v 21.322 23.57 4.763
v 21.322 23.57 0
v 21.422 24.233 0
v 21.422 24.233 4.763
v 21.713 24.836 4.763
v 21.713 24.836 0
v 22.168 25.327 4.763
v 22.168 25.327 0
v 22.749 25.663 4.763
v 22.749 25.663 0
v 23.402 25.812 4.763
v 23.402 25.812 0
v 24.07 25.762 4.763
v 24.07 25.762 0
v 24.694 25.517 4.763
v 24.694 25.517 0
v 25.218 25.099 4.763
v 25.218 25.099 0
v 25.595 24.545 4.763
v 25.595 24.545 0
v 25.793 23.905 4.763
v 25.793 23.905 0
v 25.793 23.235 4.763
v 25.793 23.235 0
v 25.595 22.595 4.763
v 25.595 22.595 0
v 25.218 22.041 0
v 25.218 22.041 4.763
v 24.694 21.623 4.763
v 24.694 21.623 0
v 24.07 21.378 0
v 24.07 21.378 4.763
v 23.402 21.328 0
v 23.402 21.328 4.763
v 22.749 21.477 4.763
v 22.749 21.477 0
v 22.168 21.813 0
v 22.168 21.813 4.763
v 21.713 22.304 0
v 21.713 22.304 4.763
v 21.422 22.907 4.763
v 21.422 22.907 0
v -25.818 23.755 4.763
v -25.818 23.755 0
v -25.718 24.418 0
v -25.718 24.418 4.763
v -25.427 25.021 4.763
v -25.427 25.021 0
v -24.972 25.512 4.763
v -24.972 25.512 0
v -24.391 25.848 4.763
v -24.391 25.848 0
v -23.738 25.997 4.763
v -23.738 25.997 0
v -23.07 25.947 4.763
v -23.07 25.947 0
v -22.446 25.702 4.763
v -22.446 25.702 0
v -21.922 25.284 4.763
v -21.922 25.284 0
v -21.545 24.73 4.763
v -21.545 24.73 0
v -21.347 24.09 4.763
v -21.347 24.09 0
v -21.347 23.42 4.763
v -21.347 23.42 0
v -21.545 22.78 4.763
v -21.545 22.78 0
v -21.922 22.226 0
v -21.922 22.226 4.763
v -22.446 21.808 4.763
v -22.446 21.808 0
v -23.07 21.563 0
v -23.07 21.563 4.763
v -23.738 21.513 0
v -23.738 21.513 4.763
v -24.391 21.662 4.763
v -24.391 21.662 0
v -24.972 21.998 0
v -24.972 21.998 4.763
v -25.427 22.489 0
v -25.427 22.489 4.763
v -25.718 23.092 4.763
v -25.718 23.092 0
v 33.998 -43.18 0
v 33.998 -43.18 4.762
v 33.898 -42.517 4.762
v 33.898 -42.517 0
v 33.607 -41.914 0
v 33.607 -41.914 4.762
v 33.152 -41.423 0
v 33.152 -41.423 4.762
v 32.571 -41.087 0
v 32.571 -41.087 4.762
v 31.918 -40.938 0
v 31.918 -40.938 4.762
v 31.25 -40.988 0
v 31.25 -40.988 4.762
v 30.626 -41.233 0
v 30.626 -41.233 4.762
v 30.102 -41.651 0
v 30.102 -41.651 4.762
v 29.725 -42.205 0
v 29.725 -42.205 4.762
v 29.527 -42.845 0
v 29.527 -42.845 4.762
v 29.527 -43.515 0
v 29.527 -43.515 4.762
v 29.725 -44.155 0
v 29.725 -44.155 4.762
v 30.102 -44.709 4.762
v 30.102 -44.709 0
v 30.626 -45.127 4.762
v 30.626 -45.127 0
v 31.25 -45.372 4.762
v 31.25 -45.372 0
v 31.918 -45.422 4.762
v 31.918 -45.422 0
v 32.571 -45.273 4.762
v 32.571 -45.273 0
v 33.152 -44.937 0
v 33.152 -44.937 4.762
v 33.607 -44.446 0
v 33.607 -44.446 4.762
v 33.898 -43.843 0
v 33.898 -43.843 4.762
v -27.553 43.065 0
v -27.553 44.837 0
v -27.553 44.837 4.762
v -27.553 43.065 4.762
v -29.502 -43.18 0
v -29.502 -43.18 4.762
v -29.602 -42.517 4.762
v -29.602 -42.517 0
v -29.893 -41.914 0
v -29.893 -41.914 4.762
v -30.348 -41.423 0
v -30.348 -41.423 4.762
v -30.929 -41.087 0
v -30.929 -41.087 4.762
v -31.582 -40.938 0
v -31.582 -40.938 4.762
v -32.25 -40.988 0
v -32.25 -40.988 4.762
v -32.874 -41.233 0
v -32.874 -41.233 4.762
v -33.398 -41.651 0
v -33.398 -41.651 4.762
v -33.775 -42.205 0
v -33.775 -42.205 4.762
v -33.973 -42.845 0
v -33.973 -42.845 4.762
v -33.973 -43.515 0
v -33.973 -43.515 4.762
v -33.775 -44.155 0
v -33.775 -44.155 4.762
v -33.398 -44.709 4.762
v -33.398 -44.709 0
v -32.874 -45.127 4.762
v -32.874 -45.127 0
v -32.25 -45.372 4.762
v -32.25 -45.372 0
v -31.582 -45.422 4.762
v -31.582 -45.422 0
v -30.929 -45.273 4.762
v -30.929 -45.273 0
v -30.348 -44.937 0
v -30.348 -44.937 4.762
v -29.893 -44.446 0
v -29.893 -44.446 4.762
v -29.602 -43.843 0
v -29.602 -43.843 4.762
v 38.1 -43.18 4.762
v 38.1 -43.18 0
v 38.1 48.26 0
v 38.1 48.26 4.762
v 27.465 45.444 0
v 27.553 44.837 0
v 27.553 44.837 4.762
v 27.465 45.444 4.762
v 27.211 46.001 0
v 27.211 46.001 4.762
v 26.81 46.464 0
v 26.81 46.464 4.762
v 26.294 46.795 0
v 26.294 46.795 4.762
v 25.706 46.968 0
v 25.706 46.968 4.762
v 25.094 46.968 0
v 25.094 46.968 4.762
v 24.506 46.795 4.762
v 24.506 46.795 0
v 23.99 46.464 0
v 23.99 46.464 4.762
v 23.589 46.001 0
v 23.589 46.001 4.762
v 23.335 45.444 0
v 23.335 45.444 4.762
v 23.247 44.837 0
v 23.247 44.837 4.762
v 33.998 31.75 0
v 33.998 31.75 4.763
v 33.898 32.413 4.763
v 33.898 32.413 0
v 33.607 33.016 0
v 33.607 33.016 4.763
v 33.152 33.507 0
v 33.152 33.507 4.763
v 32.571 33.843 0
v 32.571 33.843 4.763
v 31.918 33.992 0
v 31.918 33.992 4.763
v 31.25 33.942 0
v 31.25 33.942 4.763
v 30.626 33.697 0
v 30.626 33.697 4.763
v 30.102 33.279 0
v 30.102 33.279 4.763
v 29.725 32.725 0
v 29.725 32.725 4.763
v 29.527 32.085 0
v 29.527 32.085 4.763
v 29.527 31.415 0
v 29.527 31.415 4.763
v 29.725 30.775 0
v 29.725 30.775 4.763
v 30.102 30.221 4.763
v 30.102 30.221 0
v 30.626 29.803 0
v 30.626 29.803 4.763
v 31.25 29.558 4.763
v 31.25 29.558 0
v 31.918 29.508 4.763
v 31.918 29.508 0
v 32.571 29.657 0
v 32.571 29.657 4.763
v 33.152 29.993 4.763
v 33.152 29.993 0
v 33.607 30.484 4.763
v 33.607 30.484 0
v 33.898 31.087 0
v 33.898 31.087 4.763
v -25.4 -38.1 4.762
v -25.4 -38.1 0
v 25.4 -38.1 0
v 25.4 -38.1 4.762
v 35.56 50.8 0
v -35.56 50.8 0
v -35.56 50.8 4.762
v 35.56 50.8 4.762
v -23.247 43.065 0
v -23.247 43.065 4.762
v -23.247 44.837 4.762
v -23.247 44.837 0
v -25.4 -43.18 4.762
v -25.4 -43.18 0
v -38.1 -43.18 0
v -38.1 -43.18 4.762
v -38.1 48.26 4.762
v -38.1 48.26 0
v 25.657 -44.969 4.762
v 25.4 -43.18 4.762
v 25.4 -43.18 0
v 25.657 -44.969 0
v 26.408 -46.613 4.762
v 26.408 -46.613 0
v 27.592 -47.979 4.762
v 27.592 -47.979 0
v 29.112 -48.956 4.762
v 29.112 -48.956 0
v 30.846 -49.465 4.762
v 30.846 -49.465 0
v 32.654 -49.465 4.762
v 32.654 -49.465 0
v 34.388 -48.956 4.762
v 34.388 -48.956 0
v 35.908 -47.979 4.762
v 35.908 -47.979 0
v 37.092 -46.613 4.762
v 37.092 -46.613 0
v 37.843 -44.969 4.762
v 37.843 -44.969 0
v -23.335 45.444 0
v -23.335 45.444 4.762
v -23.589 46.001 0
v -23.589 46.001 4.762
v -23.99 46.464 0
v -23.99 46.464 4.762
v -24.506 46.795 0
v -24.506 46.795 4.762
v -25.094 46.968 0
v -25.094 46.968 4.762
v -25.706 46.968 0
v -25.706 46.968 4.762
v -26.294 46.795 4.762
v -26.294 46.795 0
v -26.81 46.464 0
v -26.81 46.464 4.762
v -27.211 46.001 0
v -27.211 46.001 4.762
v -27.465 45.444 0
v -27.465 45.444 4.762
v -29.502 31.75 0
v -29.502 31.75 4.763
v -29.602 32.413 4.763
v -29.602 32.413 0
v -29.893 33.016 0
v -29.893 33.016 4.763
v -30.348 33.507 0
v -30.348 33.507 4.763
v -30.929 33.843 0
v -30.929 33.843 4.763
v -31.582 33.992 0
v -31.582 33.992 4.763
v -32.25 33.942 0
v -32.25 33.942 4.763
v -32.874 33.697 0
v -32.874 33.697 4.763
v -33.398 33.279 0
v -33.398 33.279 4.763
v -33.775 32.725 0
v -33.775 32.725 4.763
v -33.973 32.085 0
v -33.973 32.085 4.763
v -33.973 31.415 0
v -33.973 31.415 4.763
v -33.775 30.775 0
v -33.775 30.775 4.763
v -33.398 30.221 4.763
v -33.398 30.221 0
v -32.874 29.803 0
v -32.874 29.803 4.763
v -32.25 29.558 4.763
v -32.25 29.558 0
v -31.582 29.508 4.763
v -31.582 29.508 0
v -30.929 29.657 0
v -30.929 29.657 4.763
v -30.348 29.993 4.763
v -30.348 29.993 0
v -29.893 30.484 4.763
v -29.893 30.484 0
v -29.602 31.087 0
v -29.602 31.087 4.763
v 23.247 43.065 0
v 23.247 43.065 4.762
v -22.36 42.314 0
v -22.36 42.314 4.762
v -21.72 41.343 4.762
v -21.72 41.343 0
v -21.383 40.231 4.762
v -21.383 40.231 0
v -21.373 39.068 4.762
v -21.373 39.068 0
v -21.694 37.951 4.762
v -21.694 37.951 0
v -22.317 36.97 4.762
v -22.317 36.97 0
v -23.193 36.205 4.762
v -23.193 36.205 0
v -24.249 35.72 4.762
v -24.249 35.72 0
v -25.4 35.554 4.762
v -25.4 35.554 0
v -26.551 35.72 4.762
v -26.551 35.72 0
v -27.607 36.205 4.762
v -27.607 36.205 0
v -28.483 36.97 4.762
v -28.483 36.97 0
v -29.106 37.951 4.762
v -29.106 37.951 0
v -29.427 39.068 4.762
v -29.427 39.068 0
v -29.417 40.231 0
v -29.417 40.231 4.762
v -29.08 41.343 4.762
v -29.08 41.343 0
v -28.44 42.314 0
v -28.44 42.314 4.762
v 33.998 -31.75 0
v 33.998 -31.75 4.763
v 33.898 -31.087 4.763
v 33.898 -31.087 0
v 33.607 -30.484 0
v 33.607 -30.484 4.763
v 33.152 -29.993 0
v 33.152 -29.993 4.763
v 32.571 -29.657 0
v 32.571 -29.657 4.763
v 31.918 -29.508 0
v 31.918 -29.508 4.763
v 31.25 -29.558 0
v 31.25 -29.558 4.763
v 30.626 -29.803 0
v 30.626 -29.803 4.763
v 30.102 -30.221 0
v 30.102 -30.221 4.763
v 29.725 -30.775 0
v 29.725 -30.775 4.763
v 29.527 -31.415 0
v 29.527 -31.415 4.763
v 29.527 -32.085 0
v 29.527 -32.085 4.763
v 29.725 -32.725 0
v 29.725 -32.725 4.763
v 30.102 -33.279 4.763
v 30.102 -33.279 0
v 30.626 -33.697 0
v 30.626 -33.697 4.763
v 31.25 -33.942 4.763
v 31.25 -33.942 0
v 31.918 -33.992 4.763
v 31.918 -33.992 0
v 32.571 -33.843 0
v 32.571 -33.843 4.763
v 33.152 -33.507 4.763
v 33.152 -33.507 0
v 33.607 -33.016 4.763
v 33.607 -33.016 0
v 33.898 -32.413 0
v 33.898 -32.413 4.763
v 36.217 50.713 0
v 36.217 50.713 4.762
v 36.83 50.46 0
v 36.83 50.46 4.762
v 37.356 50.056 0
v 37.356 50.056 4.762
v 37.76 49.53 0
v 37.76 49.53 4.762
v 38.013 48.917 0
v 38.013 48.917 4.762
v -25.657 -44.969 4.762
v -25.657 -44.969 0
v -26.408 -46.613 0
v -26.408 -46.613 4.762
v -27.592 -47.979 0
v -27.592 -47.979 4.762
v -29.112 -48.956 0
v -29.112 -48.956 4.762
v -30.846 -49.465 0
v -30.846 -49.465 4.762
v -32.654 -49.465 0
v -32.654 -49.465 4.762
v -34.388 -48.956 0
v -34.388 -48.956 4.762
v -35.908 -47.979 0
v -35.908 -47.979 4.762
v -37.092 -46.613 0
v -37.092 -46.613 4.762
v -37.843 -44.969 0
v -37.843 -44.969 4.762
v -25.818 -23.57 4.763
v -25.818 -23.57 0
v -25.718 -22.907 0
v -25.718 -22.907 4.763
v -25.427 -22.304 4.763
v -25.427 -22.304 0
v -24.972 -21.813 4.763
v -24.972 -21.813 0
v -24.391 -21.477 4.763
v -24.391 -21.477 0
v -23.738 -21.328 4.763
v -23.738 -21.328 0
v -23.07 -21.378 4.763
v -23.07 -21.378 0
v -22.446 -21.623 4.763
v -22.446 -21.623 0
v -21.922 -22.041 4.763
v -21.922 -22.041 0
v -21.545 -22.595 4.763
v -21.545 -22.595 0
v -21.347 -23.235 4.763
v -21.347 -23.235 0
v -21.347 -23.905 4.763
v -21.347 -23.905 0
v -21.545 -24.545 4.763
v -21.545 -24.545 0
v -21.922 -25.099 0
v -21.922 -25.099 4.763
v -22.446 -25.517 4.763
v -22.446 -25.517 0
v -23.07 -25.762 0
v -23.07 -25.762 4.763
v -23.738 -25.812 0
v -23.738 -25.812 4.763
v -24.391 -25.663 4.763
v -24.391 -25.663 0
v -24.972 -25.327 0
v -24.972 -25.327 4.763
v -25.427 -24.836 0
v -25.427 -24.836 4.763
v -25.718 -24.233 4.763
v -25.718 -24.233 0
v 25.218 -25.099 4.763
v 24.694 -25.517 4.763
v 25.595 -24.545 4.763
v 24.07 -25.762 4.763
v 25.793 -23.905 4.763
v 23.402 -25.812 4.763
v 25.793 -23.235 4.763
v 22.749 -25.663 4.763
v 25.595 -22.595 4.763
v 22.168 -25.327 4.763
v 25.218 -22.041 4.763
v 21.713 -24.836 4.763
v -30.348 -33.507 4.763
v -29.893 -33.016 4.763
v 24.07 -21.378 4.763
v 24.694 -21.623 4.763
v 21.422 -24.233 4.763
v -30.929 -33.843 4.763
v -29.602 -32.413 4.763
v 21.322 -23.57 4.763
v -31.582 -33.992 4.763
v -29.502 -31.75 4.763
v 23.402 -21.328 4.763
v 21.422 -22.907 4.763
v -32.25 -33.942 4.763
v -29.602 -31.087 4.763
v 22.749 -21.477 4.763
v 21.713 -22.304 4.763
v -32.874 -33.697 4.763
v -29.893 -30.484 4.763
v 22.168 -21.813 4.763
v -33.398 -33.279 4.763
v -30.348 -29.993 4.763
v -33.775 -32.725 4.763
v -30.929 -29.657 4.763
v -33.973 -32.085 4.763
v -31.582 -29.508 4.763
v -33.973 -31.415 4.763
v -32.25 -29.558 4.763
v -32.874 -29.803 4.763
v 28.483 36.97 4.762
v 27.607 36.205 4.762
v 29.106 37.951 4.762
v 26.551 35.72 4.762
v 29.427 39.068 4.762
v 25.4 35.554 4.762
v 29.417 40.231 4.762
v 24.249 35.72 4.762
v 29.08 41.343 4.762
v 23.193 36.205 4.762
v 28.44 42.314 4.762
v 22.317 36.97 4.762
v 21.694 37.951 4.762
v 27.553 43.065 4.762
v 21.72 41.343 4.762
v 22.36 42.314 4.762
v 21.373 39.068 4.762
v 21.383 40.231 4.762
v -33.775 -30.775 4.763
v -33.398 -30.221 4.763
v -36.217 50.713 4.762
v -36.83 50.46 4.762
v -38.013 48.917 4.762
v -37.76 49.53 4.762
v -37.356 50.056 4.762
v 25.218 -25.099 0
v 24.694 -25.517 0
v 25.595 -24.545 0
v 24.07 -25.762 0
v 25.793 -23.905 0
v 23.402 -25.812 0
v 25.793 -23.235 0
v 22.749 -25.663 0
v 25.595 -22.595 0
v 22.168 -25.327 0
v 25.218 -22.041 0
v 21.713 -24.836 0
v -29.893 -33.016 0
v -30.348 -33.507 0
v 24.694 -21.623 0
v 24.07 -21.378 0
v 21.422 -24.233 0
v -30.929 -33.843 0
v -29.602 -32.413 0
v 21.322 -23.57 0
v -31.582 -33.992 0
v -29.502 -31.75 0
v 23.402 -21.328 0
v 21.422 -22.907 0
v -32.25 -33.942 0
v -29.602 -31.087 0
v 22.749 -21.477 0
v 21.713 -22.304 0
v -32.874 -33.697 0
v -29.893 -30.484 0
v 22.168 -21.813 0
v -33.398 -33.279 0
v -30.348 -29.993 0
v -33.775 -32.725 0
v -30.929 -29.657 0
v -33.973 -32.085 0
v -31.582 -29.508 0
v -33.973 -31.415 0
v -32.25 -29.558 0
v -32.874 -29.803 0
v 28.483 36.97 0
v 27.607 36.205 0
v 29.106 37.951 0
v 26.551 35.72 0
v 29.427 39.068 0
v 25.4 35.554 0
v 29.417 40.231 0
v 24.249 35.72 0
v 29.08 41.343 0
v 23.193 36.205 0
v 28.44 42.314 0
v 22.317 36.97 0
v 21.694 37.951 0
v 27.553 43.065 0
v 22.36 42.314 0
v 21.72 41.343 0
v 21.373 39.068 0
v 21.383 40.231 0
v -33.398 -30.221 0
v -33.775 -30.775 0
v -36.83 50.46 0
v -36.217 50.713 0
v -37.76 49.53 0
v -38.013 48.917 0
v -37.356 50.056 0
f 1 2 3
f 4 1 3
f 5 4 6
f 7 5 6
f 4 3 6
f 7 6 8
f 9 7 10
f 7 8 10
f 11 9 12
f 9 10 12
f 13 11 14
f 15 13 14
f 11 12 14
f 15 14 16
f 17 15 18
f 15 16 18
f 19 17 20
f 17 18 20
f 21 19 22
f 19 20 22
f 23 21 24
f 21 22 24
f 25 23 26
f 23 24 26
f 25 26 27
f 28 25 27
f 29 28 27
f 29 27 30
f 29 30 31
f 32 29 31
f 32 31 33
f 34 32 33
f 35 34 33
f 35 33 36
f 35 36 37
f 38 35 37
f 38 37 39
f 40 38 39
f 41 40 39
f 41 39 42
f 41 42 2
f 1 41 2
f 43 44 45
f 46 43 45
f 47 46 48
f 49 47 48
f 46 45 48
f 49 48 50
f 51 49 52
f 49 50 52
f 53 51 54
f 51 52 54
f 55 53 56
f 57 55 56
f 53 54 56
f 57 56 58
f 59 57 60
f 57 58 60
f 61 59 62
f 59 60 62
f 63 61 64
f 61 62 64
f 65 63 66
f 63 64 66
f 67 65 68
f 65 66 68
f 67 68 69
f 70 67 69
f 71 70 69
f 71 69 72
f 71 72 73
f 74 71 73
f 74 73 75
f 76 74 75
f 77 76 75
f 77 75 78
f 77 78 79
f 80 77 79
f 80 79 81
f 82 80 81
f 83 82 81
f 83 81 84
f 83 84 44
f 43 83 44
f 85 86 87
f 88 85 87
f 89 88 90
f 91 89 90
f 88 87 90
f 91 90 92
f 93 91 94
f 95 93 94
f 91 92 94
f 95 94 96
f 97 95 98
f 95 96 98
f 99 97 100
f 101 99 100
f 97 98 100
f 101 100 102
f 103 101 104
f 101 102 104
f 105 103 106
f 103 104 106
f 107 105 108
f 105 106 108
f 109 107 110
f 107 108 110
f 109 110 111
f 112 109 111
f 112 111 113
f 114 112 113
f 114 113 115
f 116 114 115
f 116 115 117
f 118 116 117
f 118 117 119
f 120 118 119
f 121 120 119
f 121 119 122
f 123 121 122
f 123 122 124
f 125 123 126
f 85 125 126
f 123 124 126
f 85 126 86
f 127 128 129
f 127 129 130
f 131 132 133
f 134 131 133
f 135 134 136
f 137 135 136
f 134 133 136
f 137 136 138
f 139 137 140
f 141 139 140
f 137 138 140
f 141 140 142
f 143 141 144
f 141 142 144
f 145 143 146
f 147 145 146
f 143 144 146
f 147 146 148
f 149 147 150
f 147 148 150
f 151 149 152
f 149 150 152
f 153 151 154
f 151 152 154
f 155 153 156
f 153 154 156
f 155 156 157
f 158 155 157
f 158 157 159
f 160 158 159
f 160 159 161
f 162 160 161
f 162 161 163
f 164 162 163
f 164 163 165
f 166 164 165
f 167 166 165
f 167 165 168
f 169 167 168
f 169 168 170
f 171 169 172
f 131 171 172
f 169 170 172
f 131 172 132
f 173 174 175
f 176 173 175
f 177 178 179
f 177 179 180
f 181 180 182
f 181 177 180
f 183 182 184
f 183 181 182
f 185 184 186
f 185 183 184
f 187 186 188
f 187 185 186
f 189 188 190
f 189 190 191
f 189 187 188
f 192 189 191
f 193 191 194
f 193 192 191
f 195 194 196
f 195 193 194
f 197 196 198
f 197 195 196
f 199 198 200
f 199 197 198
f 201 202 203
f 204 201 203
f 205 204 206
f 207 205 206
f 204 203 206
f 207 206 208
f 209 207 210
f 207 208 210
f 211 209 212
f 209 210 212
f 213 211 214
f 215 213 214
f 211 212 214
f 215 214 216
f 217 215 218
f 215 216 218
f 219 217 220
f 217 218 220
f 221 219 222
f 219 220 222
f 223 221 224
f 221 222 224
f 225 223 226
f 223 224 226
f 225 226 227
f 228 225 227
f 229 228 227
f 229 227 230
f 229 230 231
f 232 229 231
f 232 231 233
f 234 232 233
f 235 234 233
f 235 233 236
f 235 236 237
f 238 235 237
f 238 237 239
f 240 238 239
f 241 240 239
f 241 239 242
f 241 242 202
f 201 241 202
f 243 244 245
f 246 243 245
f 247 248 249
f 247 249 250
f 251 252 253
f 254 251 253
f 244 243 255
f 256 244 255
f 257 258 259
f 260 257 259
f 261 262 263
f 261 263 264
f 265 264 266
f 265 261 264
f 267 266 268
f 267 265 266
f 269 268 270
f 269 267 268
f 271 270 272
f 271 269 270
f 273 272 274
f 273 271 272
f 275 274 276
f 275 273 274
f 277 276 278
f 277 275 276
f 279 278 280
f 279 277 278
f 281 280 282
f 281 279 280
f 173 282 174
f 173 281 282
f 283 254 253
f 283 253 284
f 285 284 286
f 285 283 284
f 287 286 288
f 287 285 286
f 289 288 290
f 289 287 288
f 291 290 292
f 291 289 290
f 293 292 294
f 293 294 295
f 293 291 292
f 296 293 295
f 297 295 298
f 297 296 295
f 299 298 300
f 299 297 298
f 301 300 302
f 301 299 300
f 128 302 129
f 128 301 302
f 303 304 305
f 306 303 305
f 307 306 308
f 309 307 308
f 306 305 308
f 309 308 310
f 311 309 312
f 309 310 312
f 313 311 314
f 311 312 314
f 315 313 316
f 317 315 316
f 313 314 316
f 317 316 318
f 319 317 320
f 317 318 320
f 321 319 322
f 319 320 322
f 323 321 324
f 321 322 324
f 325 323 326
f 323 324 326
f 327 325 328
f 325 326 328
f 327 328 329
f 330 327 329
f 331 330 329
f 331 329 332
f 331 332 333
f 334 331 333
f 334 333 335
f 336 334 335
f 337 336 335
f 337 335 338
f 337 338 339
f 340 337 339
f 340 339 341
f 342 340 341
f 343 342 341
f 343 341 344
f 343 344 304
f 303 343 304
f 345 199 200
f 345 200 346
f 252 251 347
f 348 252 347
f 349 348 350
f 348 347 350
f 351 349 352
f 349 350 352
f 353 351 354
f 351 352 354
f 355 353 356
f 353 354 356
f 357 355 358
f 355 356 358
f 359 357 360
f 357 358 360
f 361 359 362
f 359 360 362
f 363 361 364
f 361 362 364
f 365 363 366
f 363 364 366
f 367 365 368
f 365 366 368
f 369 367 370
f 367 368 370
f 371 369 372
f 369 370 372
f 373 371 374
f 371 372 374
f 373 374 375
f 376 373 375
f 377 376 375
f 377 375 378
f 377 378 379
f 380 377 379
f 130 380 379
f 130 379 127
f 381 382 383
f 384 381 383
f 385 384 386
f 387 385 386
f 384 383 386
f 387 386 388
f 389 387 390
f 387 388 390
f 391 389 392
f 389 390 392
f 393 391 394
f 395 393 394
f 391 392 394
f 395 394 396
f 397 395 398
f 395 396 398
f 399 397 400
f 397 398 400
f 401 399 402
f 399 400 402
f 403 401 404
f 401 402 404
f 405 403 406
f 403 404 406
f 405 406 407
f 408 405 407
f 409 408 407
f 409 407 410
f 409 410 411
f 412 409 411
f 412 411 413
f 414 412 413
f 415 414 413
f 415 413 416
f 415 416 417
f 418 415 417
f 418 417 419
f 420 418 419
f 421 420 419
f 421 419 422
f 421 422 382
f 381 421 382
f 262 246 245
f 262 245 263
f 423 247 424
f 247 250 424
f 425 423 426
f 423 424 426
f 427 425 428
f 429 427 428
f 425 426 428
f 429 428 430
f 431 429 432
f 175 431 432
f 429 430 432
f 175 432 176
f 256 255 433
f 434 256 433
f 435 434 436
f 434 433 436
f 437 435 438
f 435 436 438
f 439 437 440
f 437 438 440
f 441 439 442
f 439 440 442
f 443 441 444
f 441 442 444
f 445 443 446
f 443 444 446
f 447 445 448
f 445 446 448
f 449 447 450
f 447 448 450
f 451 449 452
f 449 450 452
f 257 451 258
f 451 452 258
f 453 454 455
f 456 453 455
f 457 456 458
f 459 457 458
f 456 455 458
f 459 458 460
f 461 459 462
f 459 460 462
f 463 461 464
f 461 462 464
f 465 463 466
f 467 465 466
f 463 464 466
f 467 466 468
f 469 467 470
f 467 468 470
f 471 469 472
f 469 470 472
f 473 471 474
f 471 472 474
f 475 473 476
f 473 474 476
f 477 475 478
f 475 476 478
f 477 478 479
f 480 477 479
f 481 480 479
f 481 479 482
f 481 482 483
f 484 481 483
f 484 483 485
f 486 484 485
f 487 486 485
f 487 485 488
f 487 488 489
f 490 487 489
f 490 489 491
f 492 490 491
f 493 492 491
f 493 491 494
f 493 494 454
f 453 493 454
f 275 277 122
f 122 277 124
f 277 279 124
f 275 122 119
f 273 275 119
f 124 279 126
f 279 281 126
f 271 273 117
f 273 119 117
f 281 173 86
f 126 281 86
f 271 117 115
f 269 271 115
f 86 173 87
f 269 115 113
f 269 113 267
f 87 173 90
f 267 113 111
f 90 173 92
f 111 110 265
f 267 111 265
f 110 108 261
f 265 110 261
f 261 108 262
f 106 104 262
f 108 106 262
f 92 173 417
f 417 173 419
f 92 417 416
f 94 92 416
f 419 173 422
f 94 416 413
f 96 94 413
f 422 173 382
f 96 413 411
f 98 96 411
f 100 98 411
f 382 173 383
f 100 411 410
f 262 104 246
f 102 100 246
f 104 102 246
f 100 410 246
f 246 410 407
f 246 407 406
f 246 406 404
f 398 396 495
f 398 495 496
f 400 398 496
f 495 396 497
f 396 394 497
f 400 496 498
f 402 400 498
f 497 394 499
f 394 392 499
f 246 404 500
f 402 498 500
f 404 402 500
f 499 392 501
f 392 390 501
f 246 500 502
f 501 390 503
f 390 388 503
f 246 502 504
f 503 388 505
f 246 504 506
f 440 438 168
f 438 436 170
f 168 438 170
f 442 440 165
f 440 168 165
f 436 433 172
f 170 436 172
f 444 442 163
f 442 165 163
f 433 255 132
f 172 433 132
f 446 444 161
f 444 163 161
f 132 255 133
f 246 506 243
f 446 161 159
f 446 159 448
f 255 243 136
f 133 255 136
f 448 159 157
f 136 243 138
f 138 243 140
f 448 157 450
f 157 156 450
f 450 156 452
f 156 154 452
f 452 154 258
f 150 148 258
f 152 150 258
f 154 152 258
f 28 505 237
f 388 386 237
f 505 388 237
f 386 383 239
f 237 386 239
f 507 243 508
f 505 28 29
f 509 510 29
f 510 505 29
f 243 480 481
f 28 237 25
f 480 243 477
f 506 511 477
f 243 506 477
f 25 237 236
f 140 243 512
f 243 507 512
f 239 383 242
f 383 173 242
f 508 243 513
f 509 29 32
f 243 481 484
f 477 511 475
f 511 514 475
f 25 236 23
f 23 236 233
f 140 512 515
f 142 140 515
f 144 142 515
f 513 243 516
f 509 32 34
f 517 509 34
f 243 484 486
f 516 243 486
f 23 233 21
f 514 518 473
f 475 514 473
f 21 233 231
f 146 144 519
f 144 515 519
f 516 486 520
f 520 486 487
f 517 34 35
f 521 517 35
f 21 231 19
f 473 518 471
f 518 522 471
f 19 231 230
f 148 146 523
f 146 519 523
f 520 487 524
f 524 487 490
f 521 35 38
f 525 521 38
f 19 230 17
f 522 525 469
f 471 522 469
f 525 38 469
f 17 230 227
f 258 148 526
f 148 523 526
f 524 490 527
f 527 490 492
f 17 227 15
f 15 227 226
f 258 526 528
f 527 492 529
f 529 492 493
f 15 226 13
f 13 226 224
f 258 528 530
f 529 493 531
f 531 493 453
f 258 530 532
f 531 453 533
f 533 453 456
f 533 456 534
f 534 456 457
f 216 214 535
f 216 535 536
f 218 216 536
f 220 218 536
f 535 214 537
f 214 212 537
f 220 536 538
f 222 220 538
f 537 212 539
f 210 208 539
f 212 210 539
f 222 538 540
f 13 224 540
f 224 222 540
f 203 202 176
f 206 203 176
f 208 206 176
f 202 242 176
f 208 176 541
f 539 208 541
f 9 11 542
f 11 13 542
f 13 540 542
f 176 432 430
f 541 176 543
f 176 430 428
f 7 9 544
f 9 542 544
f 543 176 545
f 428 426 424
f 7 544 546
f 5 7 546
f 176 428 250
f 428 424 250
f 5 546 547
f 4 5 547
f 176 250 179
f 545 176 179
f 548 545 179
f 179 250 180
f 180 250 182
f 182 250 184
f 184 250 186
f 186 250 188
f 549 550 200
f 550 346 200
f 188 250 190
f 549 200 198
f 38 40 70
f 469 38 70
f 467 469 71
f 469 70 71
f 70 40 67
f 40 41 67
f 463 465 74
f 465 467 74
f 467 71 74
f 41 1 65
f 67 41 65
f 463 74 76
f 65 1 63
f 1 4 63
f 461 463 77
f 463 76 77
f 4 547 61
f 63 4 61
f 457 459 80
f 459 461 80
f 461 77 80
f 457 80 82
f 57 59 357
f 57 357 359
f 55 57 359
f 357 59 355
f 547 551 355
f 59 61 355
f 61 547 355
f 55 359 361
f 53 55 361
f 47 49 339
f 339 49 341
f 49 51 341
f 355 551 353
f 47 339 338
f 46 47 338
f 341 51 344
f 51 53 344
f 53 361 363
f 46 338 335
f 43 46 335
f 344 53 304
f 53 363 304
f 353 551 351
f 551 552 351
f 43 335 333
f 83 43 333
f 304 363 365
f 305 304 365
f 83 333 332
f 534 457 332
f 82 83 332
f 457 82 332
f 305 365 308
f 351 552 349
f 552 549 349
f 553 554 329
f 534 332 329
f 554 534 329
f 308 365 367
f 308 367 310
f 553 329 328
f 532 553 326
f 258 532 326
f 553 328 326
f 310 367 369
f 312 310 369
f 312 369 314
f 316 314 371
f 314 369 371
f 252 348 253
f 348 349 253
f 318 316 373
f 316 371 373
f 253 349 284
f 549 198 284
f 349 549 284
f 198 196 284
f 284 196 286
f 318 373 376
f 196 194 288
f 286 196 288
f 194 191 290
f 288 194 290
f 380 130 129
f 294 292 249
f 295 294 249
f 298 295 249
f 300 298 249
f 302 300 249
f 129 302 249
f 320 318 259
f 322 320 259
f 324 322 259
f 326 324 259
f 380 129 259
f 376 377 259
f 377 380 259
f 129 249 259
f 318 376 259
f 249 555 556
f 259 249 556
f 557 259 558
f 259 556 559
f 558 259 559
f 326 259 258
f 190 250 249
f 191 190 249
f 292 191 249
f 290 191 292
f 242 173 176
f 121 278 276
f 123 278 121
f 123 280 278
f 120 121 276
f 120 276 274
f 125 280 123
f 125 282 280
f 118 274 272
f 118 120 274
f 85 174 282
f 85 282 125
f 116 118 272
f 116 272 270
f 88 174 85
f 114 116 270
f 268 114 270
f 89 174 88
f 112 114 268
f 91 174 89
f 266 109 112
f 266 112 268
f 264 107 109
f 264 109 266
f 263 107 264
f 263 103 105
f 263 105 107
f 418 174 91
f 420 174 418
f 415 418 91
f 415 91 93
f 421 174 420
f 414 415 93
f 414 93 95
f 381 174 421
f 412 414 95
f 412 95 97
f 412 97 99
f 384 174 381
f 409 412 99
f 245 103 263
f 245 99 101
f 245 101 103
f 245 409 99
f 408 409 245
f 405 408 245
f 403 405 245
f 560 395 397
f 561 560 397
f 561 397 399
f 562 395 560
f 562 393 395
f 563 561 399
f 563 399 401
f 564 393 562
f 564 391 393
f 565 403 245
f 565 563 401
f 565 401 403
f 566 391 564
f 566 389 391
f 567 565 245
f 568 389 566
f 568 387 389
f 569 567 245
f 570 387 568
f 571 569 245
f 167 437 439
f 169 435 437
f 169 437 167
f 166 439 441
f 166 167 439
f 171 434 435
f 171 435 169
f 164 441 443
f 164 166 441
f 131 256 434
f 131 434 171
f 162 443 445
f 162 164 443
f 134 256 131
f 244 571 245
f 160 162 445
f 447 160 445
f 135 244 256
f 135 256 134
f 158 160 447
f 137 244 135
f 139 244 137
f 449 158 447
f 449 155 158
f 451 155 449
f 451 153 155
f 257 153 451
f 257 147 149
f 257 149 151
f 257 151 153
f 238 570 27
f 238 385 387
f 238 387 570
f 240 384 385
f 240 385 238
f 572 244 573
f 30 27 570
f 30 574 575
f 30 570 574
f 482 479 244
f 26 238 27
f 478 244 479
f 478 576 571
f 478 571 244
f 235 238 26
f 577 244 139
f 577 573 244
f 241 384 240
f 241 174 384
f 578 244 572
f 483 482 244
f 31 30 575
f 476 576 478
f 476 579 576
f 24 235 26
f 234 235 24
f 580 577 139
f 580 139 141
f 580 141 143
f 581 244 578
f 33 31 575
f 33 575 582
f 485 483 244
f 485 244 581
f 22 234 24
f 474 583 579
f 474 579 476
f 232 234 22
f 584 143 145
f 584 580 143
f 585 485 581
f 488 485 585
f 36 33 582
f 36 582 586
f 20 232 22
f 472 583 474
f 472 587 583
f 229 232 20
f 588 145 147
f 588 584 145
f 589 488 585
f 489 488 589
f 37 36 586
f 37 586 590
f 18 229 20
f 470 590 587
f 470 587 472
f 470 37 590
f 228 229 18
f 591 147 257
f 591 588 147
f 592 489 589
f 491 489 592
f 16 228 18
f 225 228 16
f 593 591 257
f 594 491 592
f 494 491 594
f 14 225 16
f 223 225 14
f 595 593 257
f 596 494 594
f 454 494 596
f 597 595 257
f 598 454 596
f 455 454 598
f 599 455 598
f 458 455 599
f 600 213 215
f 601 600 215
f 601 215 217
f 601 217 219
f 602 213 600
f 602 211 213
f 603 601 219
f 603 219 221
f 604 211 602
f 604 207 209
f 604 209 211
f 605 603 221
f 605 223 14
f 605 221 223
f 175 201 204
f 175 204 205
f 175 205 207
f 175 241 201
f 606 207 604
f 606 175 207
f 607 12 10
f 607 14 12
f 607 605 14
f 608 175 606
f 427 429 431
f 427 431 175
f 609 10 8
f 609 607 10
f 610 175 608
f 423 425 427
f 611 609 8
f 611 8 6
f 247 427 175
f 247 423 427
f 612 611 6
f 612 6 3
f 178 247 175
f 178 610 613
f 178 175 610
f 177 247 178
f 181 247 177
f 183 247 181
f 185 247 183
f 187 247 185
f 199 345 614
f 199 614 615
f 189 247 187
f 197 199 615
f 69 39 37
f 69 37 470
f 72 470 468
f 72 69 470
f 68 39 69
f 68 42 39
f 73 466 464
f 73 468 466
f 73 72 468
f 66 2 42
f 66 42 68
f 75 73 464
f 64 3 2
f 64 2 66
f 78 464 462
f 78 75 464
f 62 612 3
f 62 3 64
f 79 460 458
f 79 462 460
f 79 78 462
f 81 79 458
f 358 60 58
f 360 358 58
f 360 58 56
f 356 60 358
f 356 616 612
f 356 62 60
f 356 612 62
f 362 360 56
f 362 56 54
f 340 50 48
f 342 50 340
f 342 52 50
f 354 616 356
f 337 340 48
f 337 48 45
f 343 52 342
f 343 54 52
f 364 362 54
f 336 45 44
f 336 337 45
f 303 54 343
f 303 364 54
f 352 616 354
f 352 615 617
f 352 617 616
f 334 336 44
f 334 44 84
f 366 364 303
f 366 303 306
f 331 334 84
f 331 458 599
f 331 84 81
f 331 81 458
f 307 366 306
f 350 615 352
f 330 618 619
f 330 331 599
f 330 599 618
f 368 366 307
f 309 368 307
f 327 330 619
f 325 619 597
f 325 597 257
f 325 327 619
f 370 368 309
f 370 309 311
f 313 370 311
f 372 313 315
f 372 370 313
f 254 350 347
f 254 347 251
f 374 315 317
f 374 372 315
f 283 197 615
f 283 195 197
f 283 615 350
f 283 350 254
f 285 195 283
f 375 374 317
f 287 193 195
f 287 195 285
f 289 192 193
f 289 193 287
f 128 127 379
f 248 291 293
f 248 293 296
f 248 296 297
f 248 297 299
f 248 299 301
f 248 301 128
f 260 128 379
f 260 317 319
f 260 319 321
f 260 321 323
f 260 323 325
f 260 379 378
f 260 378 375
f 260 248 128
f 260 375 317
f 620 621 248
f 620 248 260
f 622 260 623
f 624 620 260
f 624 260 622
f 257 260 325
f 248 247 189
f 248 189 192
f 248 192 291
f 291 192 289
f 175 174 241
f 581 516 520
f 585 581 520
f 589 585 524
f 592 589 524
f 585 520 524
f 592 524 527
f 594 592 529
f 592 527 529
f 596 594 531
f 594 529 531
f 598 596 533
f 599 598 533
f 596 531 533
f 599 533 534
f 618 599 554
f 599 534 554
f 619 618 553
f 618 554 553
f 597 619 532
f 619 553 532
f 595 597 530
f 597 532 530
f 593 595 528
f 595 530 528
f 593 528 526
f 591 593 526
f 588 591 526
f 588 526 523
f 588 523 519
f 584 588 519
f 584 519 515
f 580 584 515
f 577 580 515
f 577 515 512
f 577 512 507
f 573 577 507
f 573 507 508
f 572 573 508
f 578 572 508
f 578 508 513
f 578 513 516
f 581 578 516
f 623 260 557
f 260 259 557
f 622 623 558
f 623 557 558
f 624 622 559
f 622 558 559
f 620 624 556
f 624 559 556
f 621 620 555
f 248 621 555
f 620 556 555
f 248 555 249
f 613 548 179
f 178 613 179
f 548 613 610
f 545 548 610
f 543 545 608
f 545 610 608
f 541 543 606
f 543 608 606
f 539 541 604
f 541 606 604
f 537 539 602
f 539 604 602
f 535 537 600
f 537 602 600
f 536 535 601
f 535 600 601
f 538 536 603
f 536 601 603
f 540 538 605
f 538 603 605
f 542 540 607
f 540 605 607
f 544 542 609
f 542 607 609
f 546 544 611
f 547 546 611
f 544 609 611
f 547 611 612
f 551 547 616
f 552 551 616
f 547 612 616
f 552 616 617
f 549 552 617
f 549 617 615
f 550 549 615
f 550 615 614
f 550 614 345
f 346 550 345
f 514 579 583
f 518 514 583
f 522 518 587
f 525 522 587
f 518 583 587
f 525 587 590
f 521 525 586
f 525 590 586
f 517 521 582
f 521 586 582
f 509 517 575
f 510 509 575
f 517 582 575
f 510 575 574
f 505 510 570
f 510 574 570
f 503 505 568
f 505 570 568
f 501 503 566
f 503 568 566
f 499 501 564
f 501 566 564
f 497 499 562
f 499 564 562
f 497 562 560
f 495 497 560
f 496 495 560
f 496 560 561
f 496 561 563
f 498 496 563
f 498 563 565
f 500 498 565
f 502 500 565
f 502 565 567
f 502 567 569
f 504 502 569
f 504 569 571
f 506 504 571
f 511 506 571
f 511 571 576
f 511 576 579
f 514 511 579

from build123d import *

# Parameters (mm, degrees)
SKETCH1_W                 = 76.2
SKETCH1_H                 = 88.9
BOSS_EXTRUDE1_DEPTH       = 4.7625
F_8_CLEARANCE_HOLE1_D     = 4.4958
FILLET1_R                 = 2.54
F_8_CLEARANCE_SLOT1_DEPTH = 4.7625
SKETCH6_R                 = 4.064
CUT_EXTRUDE1_DEPTH        = 64.678343306
F_8_CLEARANCE_HOLE2_D     = 4.4958
SKETCH9_R                 = 2.2479
BOSS_EXTRUDE2_DEPTH       = 4.7625


# Read off the part's stored shape, not the designer's step: #8 Clearance Slot1
with BuildPart() as part:
    # Sketch1 → Boss-Extrude1 (new body)
    with BuildSketch(Plane.XY):
        with Locations((0, 6.35)):
            Rectangle(SKETCH1_W, SKETCH1_H)
    extrude(amount=BOSS_EXTRUDE1_DEPTH)

    # #8 Clearance Hole1 (through all)
    with Locations(Plane.XY.offset(4.7625)):
        with Locations((23.57, 23.57), (-23.57, 23.755), (23.57, -23.57), (-23.57, -23.57)):
            Hole(F_8_CLEARANCE_HOLE1_D / 2)

    # Fillet1
    fillet1_edges = [part.edges().sort_by_distance(p)[0] for p in [
        (-38.1, 50.8, 2.38125),
        (38.1, 50.8, 2.38125),
        (38.1, -38.1, 2.38125),
        (-38.1, -38.1, 2.38125),
    ]]
    fillet(fillet1_edges, radius=FILLET1_R)

    # #8 Clearance Slot1 outline → #8 Clearance Slot1 (cut)
    with BuildSketch(Plane.XY):
        with BuildLine():
            ThreePointArc((-27.55265, 39.61765), (-25.4, 37.465), (-23.24735, 39.61765))
            Line((-23.24735, 39.61765), (-23.24735, 44.83735))
            ThreePointArc((-23.24735, 44.83735), (-25.4, 46.99), (-27.55265, 44.83735))
            Line((-27.55265, 44.83735), (-27.55265, 39.61765))
        make_face()
        with BuildLine():
            ThreePointArc((23.24735, 39.61765), (25.4, 37.465), (27.55265, 39.61765))
            Line((27.55265, 39.61765), (27.55265, 44.83735))
            ThreePointArc((27.55265, 44.83735), (25.4, 46.99), (23.24735, 44.83735))
            Line((23.24735, 44.83735), (23.24735, 39.61765))
        make_face()
    extrude(amount=F_8_CLEARANCE_SLOT1_DEPTH, mode=Mode.SUBTRACT)

    # Sketch6 → Cut-Extrude1 (cut, through all)
    with BuildSketch(Plane(origin=(0, 0, 0), x_dir=(-1, 0, 0), z_dir=(0, 0, -1))):
        with Locations((-25.4, 39.61765)):
            Circle(SKETCH6_R)
        with Locations((25.4, 39.61765)):
            Circle(SKETCH6_R)
    extrude(amount=-CUT_EXTRUDE1_DEPTH, mode=Mode.SUBTRACT)

    # #8 Clearance Hole2 (through all)
    with Locations(Plane(origin=(0, 0, 0), x_dir=(-1, 0, 0), z_dir=(0, 0, -1))):
        with Locations((31.75, 31.75), (31.75, -31.75), (-31.75, -31.75), (-31.75, 31.75)):
            Hole(F_8_CLEARANCE_HOLE2_D / 2)

    # Sketch9 → Boss-Extrude2 (add, through all)
    # profile 1 of 2: a face of its own
    with BuildSketch(Plane.XY.offset(4.7625)):
        with BuildLine():
            Line((-38.1, -43.18), (-38.1, -35.56))
            Line((-38.1, -35.56), (-25.4, -35.56))
            Line((-25.4, -35.56), (-25.4, -43.18))
            ThreePointArc((-25.4, -43.18), (-31.75, -49.53), (-38.1, -43.18))
        make_face()
        with Locations((-31.75, -43.18)):
            Circle(SKETCH9_R, mode=Mode.SUBTRACT)
    # profile 2 of 2: a face of its own
    with BuildSketch(Plane.XY.offset(4.7625)):
        with BuildLine():
            Line((25.4, -35.56), (25.4, -43.18))
            ThreePointArc((25.4, -43.18), (31.75, -49.53), (38.1, -43.18))
            Line((38.1, -43.18), (38.1, -35.56))
            Line((38.1, -35.56), (25.4, -35.56))
        make_face()
        with Locations((31.75, -43.18)):
            Circle(SKETCH9_R, mode=Mode.SUBTRACT)
    extrude(amount=-BOSS_EXTRUDE2_DEPTH)


solid = part.part
